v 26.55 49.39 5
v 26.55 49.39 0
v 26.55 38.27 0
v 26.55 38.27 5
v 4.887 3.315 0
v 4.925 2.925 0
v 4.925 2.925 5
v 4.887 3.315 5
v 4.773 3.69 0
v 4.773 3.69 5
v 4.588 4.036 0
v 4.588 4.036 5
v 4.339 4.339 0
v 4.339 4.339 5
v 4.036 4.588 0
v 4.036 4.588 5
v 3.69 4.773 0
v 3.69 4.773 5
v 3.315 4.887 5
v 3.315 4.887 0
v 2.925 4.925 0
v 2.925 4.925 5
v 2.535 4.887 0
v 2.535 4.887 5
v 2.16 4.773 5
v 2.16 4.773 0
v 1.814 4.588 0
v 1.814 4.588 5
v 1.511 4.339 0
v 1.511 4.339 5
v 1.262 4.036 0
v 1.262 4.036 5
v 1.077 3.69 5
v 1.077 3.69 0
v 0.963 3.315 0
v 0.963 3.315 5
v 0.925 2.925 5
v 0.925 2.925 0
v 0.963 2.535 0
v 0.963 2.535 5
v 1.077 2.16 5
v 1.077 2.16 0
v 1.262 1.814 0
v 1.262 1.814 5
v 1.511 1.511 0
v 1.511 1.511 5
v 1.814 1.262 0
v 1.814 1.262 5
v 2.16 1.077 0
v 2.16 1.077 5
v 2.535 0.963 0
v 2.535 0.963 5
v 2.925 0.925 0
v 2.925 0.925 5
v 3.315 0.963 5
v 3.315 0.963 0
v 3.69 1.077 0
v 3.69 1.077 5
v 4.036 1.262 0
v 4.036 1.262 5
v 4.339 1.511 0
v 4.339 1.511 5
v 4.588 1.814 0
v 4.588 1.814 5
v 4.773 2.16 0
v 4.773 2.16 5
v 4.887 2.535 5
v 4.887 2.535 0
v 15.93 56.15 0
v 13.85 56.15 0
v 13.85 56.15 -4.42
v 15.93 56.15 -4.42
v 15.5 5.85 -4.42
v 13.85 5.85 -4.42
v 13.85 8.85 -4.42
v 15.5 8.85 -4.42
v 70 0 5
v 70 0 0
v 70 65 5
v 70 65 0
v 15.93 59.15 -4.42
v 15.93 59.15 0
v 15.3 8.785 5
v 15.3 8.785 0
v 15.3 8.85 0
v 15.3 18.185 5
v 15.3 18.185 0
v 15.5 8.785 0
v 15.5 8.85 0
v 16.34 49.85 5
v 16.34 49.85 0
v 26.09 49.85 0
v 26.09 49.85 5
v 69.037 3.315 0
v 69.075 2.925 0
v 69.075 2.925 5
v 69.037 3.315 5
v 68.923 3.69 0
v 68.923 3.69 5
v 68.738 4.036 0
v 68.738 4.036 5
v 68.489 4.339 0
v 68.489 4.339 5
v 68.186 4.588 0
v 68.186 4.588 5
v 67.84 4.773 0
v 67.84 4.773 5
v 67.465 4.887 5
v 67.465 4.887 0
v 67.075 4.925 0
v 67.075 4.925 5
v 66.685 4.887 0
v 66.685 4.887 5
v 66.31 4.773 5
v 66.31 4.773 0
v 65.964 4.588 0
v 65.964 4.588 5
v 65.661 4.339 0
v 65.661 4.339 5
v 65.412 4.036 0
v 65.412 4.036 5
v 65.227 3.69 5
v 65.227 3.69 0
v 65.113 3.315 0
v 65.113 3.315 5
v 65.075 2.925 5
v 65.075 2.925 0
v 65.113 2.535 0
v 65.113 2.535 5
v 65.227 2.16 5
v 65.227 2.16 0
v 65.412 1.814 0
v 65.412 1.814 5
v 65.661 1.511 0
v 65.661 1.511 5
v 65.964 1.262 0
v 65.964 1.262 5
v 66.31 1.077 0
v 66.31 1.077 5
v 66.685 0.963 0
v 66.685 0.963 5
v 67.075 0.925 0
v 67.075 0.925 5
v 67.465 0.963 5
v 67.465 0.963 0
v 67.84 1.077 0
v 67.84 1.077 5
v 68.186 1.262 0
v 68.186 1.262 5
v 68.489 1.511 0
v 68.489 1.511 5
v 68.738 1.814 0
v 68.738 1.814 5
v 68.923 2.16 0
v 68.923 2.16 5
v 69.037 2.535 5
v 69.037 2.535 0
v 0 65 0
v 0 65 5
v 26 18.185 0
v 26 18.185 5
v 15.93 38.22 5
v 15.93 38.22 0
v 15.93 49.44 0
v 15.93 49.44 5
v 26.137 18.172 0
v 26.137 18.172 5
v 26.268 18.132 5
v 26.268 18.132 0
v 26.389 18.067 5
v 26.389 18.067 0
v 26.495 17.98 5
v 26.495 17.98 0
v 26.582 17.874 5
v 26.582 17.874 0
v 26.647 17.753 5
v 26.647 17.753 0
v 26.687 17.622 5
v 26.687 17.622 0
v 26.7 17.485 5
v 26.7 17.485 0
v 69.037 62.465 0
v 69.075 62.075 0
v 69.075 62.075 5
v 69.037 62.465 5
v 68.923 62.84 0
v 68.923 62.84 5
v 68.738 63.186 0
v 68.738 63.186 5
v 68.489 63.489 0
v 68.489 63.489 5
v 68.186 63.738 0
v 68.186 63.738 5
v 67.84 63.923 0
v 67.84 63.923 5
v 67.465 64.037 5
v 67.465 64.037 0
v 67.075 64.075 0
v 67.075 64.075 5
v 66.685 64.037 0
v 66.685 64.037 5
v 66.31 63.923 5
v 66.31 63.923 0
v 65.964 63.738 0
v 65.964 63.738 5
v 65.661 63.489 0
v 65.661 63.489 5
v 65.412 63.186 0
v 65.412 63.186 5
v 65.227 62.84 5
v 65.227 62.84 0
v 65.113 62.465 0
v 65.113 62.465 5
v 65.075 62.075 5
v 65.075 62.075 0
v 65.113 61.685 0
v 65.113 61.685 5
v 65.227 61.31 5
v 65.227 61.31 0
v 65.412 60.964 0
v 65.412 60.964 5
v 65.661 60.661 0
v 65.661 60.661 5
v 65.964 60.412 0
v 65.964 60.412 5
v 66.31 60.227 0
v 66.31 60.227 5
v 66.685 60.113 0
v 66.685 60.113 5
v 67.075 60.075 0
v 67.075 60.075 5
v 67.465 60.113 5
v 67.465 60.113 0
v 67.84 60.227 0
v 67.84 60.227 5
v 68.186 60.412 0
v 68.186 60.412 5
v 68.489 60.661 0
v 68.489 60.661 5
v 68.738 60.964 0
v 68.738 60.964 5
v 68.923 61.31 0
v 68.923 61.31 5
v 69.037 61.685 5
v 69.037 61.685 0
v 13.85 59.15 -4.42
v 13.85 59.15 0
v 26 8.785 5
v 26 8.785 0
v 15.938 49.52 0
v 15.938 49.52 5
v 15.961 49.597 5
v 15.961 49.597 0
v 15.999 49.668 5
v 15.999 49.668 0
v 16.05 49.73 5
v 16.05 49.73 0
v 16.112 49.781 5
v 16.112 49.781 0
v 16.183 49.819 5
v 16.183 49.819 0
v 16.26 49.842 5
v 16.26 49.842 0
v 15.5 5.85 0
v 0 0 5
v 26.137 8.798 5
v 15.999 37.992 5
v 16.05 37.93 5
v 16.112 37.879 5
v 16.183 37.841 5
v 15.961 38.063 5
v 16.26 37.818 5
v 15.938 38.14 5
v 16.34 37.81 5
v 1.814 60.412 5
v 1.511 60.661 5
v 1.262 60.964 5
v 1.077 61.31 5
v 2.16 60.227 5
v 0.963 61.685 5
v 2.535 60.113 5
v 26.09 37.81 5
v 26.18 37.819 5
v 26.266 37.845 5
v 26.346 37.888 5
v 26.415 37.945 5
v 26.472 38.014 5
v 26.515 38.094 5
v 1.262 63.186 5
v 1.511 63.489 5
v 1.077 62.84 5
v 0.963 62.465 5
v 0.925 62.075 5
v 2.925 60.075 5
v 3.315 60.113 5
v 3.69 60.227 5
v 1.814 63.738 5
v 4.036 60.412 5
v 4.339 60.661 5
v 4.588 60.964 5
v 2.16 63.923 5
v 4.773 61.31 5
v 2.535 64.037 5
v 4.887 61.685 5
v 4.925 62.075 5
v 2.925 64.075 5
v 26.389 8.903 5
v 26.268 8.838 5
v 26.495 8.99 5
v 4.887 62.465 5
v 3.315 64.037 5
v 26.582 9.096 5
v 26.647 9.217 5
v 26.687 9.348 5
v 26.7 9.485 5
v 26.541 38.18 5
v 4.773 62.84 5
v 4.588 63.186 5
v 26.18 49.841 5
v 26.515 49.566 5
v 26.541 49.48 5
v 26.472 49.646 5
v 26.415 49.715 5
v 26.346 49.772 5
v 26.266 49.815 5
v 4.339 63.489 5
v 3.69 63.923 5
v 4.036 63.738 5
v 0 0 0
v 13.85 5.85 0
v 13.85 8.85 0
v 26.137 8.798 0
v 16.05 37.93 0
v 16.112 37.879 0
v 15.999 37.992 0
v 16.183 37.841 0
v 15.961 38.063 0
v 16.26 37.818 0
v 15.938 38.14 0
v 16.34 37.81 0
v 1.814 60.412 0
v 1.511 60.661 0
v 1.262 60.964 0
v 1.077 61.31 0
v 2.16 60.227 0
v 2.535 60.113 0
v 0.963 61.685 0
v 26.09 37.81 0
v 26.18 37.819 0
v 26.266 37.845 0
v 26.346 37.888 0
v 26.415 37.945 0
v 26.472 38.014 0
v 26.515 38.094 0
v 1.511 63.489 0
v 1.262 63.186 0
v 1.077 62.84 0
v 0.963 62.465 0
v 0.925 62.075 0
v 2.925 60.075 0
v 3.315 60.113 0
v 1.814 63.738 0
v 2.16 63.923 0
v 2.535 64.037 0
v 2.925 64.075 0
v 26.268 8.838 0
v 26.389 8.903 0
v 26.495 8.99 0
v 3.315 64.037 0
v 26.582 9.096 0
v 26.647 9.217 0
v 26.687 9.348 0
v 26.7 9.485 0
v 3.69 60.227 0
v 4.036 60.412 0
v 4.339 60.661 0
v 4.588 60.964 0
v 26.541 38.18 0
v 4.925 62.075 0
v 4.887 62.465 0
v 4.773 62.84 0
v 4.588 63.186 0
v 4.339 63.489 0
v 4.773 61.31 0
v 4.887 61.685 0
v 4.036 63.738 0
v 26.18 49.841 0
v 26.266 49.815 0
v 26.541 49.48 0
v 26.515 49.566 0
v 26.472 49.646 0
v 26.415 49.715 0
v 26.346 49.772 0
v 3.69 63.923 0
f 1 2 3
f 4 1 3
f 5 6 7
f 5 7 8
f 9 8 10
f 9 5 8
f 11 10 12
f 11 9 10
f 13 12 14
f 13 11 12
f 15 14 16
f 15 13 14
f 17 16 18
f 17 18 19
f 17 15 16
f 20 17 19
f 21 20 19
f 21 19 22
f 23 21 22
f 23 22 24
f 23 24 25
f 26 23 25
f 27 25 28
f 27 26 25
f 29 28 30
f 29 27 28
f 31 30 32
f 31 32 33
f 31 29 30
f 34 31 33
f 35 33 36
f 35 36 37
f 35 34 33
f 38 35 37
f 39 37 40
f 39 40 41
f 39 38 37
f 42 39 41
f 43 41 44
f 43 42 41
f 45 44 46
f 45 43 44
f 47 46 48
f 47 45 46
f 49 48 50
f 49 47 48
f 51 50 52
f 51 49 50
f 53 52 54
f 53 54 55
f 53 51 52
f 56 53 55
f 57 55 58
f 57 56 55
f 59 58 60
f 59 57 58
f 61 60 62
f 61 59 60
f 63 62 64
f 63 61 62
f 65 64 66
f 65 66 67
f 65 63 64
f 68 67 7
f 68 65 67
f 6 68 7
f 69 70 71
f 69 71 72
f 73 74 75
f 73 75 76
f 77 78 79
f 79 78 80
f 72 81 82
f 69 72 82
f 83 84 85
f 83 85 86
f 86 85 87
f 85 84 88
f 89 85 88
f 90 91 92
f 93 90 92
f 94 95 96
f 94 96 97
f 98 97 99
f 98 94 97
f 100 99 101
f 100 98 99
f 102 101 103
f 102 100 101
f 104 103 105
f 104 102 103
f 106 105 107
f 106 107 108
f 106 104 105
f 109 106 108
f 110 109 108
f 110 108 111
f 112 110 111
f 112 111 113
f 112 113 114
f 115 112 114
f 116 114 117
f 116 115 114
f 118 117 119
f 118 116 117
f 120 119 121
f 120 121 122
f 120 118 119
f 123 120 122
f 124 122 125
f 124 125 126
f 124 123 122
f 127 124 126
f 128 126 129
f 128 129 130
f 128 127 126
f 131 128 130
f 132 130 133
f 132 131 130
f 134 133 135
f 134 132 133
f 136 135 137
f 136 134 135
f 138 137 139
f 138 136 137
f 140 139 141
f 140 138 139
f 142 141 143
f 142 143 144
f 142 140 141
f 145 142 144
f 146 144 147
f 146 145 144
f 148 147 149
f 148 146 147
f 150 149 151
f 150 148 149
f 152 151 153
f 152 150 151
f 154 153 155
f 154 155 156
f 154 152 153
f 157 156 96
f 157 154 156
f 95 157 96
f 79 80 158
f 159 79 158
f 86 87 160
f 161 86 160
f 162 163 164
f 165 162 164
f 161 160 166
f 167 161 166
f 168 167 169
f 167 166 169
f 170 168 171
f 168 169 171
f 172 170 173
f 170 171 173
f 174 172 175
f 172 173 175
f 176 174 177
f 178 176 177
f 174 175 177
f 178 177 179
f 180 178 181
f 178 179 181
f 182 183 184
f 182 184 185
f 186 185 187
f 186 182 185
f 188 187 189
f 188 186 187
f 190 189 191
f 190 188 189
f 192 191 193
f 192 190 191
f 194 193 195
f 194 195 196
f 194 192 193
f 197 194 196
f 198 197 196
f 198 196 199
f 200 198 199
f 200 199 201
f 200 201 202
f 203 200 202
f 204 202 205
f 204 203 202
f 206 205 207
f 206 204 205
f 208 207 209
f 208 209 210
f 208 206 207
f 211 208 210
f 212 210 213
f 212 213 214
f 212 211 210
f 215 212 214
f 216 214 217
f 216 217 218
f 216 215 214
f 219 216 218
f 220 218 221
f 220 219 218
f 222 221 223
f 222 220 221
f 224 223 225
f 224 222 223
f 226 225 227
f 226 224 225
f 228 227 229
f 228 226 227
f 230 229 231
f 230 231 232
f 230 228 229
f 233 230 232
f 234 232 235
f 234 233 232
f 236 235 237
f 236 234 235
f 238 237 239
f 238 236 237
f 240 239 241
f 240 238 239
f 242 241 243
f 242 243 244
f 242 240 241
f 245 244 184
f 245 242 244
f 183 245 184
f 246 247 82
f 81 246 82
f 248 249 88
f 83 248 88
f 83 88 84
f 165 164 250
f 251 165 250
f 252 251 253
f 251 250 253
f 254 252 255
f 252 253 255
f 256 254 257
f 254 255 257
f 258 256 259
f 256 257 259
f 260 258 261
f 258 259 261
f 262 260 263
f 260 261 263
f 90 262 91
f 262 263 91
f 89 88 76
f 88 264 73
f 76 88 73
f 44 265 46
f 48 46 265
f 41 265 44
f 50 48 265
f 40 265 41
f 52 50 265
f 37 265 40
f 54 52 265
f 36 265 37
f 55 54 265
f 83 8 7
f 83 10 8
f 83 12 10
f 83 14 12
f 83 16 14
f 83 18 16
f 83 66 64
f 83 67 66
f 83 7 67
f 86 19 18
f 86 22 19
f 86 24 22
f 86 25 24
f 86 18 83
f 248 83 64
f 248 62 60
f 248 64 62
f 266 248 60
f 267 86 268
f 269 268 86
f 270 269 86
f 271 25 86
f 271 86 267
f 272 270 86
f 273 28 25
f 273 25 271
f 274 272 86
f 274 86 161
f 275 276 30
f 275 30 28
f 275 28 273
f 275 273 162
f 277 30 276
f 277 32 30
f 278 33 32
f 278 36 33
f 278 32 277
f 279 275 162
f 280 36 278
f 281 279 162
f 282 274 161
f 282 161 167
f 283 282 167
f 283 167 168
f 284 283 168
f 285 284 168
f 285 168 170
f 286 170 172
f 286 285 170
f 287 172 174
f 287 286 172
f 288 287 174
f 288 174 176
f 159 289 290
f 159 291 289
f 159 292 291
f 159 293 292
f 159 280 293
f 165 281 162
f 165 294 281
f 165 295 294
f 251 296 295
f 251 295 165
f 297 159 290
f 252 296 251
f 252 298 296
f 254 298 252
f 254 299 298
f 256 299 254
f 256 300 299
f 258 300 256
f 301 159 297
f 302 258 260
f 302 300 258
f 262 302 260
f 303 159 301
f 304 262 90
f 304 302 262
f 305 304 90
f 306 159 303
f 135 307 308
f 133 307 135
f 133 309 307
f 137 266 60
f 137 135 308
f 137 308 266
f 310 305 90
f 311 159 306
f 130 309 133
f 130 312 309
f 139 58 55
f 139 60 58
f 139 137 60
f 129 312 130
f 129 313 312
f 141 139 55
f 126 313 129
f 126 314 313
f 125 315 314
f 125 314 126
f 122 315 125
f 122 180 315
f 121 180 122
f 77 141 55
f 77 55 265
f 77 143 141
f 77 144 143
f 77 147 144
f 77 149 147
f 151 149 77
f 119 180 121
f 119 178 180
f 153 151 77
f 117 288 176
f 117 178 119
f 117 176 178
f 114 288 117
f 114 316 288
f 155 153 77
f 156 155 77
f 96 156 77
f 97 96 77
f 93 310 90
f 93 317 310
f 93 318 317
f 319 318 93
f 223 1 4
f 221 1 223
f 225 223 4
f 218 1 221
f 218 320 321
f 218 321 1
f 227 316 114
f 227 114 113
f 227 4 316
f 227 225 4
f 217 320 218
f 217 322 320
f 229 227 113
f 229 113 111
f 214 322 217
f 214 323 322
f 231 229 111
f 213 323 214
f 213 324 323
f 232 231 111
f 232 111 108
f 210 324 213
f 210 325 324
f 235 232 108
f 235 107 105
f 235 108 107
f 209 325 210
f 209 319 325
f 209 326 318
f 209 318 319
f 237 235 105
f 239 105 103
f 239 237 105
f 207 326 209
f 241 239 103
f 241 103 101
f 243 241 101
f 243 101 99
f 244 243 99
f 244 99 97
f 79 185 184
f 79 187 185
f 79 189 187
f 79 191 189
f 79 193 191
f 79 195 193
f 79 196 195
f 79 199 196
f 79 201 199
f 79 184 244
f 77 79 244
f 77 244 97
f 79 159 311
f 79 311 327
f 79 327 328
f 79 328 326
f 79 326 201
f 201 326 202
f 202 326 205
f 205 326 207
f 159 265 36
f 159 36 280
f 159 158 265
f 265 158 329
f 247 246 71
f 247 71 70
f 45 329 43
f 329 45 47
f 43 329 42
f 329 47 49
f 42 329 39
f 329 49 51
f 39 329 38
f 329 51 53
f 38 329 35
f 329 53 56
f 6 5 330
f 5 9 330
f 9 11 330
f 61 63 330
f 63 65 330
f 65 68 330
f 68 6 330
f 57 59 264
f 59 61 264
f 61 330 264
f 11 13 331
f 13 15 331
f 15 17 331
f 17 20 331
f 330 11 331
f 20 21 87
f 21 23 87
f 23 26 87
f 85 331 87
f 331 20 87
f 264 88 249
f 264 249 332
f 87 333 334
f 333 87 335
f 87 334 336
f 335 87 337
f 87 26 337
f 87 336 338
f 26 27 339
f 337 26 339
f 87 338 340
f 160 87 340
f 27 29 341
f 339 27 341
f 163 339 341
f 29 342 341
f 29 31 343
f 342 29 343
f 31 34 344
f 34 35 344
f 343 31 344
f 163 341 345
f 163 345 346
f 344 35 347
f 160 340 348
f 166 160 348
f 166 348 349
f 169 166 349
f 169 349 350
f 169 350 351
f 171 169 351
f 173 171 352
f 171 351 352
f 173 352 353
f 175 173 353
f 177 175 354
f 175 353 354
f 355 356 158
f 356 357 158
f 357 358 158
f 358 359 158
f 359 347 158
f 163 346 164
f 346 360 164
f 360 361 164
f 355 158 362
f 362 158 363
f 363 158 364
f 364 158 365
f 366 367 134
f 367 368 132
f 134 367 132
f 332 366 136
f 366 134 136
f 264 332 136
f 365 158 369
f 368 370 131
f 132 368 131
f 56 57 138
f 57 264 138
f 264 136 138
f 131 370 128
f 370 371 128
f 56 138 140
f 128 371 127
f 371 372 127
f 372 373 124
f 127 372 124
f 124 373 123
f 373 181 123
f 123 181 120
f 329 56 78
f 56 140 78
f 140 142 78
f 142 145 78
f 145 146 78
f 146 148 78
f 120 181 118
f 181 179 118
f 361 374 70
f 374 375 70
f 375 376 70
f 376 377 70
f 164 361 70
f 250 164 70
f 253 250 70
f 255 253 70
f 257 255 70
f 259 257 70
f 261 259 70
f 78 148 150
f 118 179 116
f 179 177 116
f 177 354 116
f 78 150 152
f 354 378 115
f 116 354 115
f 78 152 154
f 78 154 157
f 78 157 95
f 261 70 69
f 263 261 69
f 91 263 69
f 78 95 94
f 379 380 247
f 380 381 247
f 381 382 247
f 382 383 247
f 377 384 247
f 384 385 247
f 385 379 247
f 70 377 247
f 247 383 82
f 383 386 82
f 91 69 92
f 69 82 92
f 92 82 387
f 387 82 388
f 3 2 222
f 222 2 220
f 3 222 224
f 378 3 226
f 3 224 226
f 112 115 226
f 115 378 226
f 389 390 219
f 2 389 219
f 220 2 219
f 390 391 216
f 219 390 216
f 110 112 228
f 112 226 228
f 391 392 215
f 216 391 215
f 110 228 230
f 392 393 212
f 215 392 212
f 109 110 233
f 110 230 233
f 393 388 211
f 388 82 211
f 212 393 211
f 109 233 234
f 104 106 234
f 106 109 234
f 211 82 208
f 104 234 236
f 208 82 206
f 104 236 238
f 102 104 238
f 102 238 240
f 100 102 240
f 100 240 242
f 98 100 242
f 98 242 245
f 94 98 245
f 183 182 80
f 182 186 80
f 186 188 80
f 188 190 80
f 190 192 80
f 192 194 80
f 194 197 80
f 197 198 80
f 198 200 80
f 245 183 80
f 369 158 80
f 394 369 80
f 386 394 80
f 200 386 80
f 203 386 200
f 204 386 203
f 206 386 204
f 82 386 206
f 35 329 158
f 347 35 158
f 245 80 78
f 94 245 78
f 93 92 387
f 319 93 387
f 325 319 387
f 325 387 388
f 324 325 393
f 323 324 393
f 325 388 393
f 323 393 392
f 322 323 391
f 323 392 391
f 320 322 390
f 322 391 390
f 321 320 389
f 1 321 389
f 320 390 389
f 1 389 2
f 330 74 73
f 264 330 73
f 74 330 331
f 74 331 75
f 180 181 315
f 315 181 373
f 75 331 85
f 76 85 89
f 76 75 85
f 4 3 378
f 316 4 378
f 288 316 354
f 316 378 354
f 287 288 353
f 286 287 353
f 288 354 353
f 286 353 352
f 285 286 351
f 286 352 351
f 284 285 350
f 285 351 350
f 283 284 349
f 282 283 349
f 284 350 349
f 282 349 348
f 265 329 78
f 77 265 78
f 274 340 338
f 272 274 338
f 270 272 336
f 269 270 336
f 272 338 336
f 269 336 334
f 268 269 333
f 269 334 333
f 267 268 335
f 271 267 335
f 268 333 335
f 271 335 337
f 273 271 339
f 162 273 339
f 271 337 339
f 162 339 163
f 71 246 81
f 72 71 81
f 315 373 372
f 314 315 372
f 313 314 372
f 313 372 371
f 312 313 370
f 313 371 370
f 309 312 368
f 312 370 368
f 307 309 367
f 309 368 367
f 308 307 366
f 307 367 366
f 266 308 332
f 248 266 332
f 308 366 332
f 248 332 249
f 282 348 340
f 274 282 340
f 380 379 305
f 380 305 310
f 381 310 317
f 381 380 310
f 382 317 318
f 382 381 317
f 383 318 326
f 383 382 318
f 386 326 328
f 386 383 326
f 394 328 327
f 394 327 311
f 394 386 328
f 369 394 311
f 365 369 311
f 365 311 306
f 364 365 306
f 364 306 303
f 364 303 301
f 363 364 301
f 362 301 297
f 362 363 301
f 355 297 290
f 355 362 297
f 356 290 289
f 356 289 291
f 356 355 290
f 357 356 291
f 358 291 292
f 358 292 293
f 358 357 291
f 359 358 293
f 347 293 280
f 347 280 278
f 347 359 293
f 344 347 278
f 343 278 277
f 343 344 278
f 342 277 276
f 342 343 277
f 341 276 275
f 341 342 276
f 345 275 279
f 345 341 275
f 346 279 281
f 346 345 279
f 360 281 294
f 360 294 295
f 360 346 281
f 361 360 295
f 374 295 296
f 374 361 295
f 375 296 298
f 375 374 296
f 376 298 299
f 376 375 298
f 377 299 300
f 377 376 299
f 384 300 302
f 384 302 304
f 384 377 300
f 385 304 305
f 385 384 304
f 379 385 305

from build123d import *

# Parameters (mm, degrees)
SKIZZE1_R                       = 2
AUFSATZ_LINEAR_AUSTRAGEN1_DEPTH = 5
SKIZZE2_W                       = 1.65
SKIZZE2_H                       = 4.42
AUFSATZ_LINEAR_AUSTRAGEN2_DEPTH = 3
SKIZZE3_W                       = 2.08
SKIZZE3_H                       = 4.42
AUFSATZ_LINEAR_AUSTRAGEN3_DEPTH = 3


with BuildPart() as part:
    # Skizze1 → Aufsatz-Linear austragen1 (new body)
    # profile 1 of 2: a face of its own
    with BuildSketch(Plane.XY):
        Polygon((70, 5.85), (70, 59.15), (13.85, 59.15), (13.85, 58.15), (10.85, 58.15), (10.85, 59.15), (5.85, 59.15), (5.85, 5.85), (10.85, 5.85), (10.85, 6.85), (13.85, 6.85), (13.85, 5.85), align=None)
        with BuildLine():
            Line((26.7, 17.485), (26.7, 9.485))
            ThreePointArc((26.7, 9.485), (26.494974747, 8.990025253), (26, 8.785))
            Line((26, 8.785), (15.3, 8.785))
            Line((15.3, 8.785), (15.3, 18.185))
            Line((15.3, 18.185), (26, 18.185))
            ThreePointArc((26, 18.185), (26.494974747, 17.979974747), (26.7, 17.485))
        make_face(mode=Mode.SUBTRACT)
        with BuildLine():
            Line((16.34, 49.85), (25.99, 49.85))
            Line((25.99, 49.85), (26.09, 49.85))
            ThreePointArc((26.09, 49.85), (26.415269119, 49.715269119), (26.55, 49.39))
            Line((26.55, 49.39), (26.55, 38.27))
            ThreePointArc((26.55, 38.27), (26.415269119, 37.944730881), (26.09, 37.81))
            Line((26.09, 37.81), (25.99, 37.81))
            Line((25.99, 37.81), (16.34, 37.81))
            ThreePointArc((16.34, 37.81), (16.05008622, 37.93008622), (15.93, 38.22))
            Line((15.93, 38.22), (15.93, 49.44))
            ThreePointArc((15.93, 49.44), (16.05008622, 49.72991378), (16.34, 49.85))
        make_face(mode=Mode.SUBTRACT)
    # profile 2 of 2: a face of its own
    with BuildSketch(Plane.XY):
        Polygon((13.85, 59.15), (70, 59.15), (70, 65), (0, 65), (0, 0), (70, 0), (70, 5.85), (13.85, 5.85), (13.85, 6.85), (10.85, 6.85), (10.85, 5.85), (5.85, 5.85), (5.85, 59.15), (10.85, 59.15), (10.85, 58.15), (13.85, 58.15), align=None)
        with Locations((2.925, 2.925)):
            Circle(SKIZZE1_R, mode=Mode.SUBTRACT)
        with Locations((67.075, 2.925)):
            Circle(SKIZZE1_R, mode=Mode.SUBTRACT)
        with Locations((2.925, 62.075)):
            Circle(SKIZZE1_R, mode=Mode.SUBTRACT)
        with Locations((67.075, 62.075)):
            Circle(SKIZZE1_R, mode=Mode.SUBTRACT)
    extrude(amount=AUFSATZ_LINEAR_AUSTRAGEN1_DEPTH)

    # Skizze2 → Aufsatz-Linear austragen2 (add)
    with BuildSketch(Plane(origin=(0, 5.85, 0), x_dir=(1, 0, 0), z_dir=(0, 1, 0))):
        with Locations((14.675, 2.21)):
            Rectangle(SKIZZE2_W, SKIZZE2_H)
    extrude(amount=AUFSATZ_LINEAR_AUSTRAGEN2_DEPTH)

    # Skizze3 → Aufsatz-Linear austragen3 (add)
    with BuildSketch(Plane.XZ.offset(-59.15)):
        with Locations((14.89, -2.21)):
            Rectangle(SKIZZE3_W, SKIZZE3_H)
    extrude(amount=AUFSATZ_LINEAR_AUSTRAGEN3_DEPTH)


solid = part.part
